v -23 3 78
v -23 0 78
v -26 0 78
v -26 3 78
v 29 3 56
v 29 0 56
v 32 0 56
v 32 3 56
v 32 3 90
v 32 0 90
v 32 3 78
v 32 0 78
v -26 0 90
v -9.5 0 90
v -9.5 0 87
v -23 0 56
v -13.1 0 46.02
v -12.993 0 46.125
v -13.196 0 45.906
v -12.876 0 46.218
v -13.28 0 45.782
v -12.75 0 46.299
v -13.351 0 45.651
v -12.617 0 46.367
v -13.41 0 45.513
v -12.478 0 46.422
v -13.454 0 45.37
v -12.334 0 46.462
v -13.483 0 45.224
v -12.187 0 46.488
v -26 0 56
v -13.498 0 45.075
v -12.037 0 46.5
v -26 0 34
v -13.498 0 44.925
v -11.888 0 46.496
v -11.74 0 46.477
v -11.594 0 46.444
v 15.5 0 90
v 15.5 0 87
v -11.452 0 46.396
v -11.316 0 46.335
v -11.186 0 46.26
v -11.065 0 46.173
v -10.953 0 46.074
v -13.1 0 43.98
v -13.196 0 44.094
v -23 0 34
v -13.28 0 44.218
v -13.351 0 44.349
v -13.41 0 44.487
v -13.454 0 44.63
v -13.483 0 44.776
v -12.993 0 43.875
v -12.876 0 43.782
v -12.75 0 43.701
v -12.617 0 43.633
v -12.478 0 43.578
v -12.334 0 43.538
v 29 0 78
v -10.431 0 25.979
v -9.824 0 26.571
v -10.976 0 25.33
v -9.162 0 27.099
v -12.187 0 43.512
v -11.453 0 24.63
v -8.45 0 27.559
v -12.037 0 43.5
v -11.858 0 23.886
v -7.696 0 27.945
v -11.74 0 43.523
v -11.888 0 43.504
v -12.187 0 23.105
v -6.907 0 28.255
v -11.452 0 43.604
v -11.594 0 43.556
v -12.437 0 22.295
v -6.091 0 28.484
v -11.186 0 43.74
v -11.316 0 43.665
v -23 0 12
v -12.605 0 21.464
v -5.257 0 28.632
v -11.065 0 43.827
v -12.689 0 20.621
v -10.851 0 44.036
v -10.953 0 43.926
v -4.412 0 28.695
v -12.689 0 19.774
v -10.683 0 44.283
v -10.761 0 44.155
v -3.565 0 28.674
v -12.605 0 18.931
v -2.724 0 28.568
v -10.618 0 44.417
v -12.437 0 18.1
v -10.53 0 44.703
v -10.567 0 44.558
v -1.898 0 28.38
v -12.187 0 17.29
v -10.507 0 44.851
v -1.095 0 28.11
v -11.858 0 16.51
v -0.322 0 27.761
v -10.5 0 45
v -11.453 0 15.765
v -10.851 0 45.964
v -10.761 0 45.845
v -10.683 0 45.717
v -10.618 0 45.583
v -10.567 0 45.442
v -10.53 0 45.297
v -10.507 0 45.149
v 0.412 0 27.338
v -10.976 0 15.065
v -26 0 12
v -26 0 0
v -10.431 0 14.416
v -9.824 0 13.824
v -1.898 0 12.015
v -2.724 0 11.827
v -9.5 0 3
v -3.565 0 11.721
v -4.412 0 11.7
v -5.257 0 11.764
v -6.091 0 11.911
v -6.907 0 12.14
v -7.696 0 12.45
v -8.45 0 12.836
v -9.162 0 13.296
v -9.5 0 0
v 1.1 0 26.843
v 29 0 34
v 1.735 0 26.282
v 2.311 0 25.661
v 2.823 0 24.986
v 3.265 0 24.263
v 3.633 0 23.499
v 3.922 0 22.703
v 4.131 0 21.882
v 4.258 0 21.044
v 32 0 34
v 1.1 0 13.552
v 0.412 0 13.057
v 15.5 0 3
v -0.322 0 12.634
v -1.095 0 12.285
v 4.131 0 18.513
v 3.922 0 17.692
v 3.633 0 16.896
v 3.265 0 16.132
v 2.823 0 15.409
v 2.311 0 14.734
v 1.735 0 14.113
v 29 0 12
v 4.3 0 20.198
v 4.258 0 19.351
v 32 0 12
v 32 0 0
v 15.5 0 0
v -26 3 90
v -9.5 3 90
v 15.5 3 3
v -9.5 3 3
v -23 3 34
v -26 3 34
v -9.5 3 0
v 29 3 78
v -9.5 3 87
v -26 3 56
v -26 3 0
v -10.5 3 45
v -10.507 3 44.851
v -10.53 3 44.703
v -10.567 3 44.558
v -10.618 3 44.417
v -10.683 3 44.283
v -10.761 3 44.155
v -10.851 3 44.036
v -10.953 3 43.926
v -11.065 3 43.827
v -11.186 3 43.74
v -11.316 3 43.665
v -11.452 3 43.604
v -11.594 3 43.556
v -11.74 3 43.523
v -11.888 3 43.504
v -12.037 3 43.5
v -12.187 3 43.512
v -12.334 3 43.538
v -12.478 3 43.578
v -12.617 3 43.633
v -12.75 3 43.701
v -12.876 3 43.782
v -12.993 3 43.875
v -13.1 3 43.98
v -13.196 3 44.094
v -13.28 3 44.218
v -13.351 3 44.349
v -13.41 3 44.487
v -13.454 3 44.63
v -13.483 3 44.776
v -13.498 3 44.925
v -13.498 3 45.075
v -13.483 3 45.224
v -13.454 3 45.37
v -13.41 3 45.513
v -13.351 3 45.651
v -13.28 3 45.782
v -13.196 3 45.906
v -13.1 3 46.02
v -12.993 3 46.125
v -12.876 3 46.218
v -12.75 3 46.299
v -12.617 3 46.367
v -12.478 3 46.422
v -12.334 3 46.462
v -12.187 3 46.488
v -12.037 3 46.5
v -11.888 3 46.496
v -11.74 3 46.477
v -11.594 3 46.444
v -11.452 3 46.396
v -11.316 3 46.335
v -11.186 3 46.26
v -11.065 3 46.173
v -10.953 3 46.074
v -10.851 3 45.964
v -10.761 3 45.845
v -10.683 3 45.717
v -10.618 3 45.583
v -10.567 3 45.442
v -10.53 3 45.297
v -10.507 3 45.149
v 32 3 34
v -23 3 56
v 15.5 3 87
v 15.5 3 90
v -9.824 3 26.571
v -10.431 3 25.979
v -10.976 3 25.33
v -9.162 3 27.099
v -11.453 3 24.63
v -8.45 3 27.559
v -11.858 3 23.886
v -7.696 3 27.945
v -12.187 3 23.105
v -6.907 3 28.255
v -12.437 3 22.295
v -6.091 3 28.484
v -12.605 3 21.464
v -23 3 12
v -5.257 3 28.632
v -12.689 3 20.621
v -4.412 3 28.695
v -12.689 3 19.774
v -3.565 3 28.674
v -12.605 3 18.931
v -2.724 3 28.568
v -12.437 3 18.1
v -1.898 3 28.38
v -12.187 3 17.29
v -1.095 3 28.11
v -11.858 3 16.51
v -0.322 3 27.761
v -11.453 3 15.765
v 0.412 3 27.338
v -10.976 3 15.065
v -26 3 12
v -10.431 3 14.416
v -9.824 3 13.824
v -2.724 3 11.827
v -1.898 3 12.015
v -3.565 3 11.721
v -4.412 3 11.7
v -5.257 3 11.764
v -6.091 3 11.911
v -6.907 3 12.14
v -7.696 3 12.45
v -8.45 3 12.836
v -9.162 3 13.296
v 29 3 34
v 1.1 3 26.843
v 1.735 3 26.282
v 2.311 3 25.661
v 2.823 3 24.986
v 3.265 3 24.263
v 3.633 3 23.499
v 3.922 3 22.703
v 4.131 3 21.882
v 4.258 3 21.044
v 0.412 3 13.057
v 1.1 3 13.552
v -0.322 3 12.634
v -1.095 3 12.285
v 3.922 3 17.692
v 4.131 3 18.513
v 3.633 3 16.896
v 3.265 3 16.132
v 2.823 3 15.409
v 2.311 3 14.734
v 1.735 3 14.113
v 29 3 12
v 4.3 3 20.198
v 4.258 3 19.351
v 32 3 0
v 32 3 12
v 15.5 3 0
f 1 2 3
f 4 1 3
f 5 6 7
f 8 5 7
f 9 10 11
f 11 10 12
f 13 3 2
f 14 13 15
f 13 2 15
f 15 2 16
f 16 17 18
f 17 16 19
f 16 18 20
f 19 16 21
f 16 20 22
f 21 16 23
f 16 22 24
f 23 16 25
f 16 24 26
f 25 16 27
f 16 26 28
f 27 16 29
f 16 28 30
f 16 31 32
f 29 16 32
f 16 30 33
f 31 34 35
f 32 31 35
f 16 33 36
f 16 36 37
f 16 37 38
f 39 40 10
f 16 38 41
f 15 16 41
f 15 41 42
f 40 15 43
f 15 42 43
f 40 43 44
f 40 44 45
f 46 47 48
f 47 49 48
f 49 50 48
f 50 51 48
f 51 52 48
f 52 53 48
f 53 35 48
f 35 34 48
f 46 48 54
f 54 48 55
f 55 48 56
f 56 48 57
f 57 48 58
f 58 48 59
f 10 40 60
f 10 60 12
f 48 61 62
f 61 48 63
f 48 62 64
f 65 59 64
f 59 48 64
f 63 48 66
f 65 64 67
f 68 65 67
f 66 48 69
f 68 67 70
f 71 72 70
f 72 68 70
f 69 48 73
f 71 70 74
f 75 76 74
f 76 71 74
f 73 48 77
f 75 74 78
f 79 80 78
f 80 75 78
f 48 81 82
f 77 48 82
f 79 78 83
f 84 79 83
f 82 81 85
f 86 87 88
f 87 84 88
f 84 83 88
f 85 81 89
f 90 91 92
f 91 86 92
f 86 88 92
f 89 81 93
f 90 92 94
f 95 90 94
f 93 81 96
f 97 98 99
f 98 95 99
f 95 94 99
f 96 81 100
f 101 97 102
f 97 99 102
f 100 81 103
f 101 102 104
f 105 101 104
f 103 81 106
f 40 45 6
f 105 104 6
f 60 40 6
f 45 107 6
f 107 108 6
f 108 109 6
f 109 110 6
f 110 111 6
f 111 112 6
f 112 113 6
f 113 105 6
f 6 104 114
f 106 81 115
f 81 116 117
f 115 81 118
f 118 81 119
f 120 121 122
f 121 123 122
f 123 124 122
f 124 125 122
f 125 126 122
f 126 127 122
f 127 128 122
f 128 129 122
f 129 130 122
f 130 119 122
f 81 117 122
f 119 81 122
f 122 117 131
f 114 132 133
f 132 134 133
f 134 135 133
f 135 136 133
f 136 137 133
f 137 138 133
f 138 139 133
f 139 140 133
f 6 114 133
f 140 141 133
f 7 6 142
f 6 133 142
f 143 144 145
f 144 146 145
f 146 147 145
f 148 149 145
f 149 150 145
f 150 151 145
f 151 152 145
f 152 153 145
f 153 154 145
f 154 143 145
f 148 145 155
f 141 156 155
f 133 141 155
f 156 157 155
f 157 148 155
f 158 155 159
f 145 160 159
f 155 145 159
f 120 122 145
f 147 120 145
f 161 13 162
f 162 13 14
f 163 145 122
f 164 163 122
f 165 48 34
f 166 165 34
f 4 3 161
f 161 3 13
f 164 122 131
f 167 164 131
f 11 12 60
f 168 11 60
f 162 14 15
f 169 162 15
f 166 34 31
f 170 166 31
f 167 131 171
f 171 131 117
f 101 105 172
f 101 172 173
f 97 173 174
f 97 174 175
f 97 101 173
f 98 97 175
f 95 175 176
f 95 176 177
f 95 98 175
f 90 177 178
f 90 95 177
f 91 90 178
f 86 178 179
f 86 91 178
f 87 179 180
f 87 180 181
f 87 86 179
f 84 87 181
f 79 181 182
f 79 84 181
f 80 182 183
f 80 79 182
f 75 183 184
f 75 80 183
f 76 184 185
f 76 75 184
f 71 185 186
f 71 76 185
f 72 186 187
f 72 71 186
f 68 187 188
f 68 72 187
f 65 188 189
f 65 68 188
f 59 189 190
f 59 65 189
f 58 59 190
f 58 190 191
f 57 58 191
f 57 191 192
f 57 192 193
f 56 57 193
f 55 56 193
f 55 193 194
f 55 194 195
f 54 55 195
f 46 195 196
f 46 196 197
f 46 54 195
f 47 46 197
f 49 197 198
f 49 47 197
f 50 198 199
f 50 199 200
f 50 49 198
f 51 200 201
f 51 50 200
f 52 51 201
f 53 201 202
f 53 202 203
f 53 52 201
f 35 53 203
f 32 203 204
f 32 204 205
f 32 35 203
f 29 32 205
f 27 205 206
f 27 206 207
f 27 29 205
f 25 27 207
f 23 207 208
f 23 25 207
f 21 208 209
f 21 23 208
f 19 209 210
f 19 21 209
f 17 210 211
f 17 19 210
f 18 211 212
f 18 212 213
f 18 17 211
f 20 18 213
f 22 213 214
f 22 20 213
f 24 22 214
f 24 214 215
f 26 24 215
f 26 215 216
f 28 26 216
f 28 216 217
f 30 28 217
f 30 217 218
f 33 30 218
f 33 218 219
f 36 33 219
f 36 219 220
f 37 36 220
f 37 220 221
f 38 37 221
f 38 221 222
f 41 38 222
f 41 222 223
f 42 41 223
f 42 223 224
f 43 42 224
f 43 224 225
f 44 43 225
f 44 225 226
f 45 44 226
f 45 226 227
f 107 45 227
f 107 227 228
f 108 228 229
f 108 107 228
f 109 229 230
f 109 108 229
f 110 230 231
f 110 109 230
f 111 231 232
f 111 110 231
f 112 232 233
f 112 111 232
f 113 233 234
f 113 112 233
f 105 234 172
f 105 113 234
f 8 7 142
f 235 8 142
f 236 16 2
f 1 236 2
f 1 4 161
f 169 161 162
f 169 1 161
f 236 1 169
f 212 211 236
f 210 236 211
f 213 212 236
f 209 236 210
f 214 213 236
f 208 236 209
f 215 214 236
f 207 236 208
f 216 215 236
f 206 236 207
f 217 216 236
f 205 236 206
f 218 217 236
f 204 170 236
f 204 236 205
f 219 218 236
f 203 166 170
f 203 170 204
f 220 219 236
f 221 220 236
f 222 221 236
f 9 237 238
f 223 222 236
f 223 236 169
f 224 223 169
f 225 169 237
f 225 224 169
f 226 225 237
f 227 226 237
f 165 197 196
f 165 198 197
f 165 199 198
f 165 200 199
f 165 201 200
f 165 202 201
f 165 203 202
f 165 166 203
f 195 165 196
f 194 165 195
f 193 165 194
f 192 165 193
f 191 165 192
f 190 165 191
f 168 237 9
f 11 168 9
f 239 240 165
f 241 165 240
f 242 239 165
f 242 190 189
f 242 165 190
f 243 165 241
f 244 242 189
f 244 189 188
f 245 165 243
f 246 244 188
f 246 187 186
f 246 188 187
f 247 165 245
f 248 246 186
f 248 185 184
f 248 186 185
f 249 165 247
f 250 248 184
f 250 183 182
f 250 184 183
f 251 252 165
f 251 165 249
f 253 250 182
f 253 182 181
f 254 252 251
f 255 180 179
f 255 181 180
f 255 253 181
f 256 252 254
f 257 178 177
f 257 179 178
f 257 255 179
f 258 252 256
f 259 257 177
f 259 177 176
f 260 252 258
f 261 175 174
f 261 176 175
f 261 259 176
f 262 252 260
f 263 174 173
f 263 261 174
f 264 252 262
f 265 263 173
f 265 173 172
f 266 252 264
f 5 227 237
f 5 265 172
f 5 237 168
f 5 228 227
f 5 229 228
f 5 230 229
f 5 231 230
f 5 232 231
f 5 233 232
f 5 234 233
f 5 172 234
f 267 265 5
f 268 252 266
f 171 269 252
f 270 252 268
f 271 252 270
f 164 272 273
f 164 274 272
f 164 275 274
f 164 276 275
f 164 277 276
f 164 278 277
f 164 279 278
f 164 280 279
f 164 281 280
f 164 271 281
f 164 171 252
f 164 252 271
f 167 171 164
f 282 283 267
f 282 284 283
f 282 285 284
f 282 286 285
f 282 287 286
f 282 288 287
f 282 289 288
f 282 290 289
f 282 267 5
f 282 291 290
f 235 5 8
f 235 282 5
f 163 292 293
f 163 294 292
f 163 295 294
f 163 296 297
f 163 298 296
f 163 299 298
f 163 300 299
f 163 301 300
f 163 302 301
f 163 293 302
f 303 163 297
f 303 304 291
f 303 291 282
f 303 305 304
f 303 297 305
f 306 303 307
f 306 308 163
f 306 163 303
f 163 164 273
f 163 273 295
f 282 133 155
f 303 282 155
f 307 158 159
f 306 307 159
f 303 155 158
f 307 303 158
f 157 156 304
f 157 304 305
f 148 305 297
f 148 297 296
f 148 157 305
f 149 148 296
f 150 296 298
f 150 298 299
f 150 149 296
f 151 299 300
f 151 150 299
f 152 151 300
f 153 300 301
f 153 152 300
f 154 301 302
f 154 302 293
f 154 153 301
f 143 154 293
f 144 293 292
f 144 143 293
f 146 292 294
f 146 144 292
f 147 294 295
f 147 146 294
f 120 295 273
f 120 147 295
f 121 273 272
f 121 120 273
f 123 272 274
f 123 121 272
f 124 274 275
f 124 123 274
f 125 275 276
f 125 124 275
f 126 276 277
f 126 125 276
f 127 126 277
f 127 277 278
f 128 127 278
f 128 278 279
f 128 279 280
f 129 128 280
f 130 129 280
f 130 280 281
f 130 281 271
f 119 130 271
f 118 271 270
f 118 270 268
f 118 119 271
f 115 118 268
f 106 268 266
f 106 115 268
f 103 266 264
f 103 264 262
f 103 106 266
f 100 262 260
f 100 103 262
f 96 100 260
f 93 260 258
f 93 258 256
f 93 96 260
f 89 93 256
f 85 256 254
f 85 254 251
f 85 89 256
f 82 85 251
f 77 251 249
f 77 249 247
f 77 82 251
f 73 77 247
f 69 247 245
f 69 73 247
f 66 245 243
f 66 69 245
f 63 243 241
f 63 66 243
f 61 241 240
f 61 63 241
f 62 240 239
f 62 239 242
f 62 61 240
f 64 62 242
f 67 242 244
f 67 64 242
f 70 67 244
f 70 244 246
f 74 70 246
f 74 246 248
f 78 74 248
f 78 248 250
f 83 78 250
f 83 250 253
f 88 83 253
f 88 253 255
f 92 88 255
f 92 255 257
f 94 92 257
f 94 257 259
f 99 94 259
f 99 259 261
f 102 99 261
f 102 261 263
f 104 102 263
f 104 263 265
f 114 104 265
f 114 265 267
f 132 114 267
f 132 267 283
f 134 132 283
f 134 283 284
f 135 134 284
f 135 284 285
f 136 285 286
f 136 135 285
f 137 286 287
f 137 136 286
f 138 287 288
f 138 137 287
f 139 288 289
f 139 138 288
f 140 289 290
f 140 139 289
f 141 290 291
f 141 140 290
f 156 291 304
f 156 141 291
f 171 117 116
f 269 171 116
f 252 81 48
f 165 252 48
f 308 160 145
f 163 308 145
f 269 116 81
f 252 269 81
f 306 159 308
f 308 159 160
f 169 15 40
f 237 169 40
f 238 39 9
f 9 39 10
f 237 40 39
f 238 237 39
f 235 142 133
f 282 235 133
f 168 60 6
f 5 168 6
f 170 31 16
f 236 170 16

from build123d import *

# Parameters (mm, degrees)
SKETCH4_R           = 8.5
SKETCH4_R_2         = 1.5
BOSS_EXTRUDE1_DEPTH = 3


with BuildPart() as part:
    # Sketch4 → Boss-Extrude1 (new body)
    with BuildSketch(Plane(origin=(0, 0, 0), x_dir=(1, 0, 0), z_dir=(0, 1, 0))):
        Polygon((-26, -90), (-9.5, -90), (-9.5, -87), (15.5, -87), (15.5, -90), (32, -90), (32, -78), (29, -78), (29, -56), (32, -56), (32, -34), (29, -34), (29, -12), (32, -12), (32, 0), (15.5, 0), (15.5, -3), (-9.5, -3), (-9.5, 0), (-26, 0), (-26, -12), (-23, -12), (-23, -34), (-26, -34), (-26, -56), (-23, -56), (-23, -78), (-26, -78), align=None)
        with Locations((-4.2, -20.197580763)):
            Circle(SKETCH4_R, mode=Mode.SUBTRACT)
        with Locations((-12, -45)):
            Circle(SKETCH4_R_2, mode=Mode.SUBTRACT)
    extrude(amount=BOSS_EXTRUDE1_DEPTH)


solid = part.part
